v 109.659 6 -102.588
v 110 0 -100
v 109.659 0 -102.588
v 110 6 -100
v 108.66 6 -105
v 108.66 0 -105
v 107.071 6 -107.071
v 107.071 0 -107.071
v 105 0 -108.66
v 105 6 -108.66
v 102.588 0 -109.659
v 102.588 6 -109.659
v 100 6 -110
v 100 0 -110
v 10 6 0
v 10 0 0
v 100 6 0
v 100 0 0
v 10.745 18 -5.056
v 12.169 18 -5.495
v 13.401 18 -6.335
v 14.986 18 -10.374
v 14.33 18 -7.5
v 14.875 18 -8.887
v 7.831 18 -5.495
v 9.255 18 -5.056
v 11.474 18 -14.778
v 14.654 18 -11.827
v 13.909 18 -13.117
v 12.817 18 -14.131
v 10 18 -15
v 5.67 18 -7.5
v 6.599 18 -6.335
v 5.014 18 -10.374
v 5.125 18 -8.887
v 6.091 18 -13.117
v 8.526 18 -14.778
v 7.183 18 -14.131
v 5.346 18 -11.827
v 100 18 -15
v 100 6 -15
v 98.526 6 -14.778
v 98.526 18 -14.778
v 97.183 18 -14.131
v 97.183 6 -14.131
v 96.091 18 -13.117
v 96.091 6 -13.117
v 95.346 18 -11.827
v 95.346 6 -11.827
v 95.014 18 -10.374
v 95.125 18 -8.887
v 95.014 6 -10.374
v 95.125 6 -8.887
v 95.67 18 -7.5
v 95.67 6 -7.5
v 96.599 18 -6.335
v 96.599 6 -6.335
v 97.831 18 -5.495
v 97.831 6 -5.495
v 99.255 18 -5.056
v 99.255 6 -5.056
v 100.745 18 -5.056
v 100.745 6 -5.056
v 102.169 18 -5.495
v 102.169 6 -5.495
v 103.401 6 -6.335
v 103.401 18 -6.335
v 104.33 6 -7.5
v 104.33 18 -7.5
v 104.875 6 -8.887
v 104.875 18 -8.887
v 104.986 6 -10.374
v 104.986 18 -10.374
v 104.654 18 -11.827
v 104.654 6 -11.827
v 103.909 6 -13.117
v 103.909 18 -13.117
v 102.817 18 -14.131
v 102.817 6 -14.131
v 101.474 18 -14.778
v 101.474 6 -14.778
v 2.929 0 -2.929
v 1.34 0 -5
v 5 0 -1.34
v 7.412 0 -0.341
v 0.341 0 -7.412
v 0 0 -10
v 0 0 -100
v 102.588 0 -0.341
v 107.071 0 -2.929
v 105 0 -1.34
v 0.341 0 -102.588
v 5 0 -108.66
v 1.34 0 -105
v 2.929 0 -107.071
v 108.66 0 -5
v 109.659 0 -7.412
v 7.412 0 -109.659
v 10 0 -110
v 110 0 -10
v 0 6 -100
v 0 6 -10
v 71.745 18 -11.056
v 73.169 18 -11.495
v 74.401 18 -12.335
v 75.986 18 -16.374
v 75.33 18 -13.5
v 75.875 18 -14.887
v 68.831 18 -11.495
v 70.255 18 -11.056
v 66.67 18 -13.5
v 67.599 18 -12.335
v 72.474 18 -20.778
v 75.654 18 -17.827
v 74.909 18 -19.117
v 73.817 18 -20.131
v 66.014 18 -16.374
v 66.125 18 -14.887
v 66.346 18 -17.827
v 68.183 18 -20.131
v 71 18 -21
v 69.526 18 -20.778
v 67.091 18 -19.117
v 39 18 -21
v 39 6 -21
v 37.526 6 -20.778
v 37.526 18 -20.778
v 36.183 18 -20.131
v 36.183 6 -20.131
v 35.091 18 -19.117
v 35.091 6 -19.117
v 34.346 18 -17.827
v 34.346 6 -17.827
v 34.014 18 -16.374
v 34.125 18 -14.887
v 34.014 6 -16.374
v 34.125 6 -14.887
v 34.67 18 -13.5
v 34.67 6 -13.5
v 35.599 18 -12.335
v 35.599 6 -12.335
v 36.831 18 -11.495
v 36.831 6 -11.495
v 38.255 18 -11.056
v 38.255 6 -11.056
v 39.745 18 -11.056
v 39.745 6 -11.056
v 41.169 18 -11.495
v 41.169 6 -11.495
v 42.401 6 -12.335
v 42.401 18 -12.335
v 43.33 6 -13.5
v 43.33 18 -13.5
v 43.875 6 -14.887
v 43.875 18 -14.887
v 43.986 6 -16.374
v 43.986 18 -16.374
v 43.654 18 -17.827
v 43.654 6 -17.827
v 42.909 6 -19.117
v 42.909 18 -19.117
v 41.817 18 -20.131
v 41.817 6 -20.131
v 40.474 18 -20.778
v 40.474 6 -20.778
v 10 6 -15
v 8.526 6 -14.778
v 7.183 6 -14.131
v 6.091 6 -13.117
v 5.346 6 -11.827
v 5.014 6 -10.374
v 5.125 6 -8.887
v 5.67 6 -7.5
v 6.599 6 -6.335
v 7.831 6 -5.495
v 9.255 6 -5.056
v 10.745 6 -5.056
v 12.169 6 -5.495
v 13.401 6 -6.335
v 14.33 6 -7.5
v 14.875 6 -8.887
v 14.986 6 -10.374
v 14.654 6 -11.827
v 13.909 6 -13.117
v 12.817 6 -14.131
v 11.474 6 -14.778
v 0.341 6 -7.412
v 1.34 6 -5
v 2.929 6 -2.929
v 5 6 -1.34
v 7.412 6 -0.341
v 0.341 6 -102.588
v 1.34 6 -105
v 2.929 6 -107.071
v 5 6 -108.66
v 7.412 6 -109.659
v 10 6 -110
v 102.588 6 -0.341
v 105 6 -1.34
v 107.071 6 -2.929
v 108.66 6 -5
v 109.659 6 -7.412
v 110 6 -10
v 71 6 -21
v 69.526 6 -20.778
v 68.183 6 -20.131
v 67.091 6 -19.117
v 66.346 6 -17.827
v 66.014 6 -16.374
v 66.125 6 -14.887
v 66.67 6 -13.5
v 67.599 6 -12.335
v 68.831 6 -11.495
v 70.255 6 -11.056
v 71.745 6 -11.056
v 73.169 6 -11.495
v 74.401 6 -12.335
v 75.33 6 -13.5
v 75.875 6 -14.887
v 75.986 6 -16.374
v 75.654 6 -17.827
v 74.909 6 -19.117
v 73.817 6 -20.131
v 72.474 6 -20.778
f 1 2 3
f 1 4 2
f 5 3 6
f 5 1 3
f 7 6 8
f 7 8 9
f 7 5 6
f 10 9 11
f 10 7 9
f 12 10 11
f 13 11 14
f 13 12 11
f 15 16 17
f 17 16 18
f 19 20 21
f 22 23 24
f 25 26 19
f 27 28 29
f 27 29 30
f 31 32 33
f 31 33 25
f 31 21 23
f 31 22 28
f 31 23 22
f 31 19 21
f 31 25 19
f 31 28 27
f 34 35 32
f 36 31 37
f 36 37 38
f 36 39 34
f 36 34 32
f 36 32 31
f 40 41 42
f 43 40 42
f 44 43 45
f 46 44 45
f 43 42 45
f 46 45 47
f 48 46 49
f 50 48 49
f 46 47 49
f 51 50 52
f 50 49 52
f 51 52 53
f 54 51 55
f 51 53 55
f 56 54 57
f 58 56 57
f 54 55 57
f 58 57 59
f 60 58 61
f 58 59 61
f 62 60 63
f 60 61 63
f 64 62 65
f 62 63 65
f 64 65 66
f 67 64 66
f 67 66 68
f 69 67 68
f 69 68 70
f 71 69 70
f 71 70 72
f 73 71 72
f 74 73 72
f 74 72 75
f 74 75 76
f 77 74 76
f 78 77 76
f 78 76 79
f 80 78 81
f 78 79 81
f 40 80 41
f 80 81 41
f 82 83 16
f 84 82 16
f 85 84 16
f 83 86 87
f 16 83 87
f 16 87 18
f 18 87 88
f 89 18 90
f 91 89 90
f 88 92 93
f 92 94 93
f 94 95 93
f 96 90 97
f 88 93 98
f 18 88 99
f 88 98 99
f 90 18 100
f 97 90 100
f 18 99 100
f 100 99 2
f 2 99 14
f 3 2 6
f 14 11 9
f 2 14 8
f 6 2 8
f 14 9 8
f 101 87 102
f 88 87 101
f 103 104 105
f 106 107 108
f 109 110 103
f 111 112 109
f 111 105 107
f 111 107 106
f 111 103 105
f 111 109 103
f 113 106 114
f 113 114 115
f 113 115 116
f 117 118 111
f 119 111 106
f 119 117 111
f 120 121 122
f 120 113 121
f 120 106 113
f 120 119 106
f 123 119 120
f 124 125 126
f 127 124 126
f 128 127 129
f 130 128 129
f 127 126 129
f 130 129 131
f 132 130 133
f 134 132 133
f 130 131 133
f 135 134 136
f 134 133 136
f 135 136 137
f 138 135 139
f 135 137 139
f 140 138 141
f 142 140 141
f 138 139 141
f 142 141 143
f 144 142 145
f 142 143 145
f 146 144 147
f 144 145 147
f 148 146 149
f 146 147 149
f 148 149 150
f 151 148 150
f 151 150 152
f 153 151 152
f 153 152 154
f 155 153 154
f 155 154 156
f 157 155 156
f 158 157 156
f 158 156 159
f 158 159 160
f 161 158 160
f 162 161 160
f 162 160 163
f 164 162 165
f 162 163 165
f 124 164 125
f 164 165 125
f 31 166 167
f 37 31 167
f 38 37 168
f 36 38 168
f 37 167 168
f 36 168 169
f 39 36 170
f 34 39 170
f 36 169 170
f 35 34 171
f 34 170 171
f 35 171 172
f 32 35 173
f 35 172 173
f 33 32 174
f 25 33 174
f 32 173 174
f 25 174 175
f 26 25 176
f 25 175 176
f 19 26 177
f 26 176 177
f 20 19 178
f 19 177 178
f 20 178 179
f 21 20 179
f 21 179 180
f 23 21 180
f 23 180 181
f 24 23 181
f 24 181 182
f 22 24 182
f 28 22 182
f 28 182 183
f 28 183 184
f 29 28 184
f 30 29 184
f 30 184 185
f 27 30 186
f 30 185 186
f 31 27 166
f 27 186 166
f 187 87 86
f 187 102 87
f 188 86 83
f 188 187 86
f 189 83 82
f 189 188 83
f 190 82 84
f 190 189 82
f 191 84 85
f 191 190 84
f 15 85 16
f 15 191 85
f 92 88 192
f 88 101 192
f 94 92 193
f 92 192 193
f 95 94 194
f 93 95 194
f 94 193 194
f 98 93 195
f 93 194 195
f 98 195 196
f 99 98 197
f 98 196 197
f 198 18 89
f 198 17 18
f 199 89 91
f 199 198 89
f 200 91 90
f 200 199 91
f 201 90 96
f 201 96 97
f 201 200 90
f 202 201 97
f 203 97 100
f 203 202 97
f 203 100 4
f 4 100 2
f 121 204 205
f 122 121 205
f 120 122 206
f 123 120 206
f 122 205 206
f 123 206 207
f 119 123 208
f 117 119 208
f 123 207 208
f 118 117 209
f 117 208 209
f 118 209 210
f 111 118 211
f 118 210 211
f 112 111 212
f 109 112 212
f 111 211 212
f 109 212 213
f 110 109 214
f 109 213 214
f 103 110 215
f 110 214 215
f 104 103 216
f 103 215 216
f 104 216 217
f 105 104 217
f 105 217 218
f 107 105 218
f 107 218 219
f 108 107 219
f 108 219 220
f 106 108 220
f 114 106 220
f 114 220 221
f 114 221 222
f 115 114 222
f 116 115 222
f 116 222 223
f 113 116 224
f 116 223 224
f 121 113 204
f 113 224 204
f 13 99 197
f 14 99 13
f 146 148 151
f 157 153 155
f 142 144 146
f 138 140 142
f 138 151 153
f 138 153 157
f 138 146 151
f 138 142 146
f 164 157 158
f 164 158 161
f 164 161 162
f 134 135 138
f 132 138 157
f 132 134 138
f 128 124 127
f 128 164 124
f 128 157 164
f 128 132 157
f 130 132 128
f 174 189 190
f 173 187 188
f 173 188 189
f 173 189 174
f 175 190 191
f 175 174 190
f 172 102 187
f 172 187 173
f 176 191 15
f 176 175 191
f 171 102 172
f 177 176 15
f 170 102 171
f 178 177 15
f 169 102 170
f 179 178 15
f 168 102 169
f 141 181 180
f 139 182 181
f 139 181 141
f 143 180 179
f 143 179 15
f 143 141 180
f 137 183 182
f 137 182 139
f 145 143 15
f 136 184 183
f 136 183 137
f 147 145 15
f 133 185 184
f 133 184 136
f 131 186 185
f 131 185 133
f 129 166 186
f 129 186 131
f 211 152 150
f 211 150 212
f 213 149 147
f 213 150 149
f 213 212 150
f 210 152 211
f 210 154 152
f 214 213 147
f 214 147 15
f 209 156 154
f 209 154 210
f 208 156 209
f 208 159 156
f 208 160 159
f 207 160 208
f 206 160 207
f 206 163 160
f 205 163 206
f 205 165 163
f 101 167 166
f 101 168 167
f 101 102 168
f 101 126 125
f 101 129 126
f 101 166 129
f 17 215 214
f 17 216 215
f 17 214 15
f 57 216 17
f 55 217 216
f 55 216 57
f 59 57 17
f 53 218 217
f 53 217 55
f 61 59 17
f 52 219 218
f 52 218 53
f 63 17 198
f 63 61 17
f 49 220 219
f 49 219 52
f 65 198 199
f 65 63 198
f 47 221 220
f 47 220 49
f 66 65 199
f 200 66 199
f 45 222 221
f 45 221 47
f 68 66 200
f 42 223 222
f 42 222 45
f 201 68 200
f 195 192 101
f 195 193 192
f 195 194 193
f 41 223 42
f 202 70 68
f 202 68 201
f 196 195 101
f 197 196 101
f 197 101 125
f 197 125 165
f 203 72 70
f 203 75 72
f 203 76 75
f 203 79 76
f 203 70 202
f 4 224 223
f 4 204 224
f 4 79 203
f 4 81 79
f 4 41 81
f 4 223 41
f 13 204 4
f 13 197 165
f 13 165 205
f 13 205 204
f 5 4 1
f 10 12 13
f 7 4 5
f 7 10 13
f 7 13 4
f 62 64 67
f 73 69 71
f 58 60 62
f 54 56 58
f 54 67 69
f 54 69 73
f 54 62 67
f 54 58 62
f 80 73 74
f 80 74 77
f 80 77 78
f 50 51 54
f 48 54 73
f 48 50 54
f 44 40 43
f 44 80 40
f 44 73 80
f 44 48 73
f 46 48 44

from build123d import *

# Parameters (mm, degrees)
SKETCH1_W           = 110
SKETCH1_H           = 110
BOSS_EXTRUDE1_DEPTH = 6
FILLET1_R           = 10
SKETCH12_R          = 5
BOSS_EXTRUDE5_DEPTH = 12
SKETCH13_R          = 5
BOSS_EXTRUDE6_DEPTH = 12
SKETCH14_R          = 5
BOSS_EXTRUDE7_DEPTH = 12
SKETCH15_R          = 5
BOSS_EXTRUDE8_DEPTH = 12


with BuildPart() as part:
    # Sketch1 → Boss-Extrude1 (new body)
    with BuildSketch(Plane(origin=(0, 0, 0), x_dir=(1, 0, 0), z_dir=(0, 1, 0))):
        with Locations((55, 55)):
            Rectangle(SKETCH1_W, SKETCH1_H)
    extrude(amount=BOSS_EXTRUDE1_DEPTH)

    # Fillet1
    fillet1_edges = [part.edges().sort_by_distance(p)[0] for p in [
        (0, 3, -110),
        (110, 3, -110),
        (110, 3, 0),
        (0, 3, 0),
    ]]
    fillet(fillet1_edges, radius=FILLET1_R)

    # Sketch12 → Boss-Extrude5 (add)
    with BuildSketch(Plane(origin=(0, 6, 0), x_dir=(1, 0, 0), z_dir=(0, 1, 0))):
        with Locations(Location((39, 16, 0), (0, 0, 90))):
            Circle(SKETCH12_R)
    extrude(amount=BOSS_EXTRUDE5_DEPTH)

    # Sketch13 → Boss-Extrude6 (add)
    with BuildSketch(Plane(origin=(0, 6, 0), x_dir=(1, 0, 0), z_dir=(0, 1, 0))):
        with Locations(Location((71, 16, 0), (0, 0, 90))):
            Circle(SKETCH13_R)
    extrude(amount=BOSS_EXTRUDE6_DEPTH)

    # Sketch14 → Boss-Extrude7 (add)
    with BuildSketch(Plane(origin=(0, 6, 0), x_dir=(1, 0, 0), z_dir=(0, 1, 0))):
        with Locations(Location((10, 10, 0), (0, 0, 90))):
            Circle(SKETCH14_R)
    extrude(amount=BOSS_EXTRUDE7_DEPTH)

    # Sketch15 → Boss-Extrude8 (add)
    with BuildSketch(Plane(origin=(0, 6, 0), x_dir=(1, 0, 0), z_dir=(0, 1, 0))):
        with Locations(Location((100, 10, 0), (0, 0, 90))):
            Circle(SKETCH15_R)
    extrude(amount=BOSS_EXTRUDE8_DEPTH)


solid = part.part
